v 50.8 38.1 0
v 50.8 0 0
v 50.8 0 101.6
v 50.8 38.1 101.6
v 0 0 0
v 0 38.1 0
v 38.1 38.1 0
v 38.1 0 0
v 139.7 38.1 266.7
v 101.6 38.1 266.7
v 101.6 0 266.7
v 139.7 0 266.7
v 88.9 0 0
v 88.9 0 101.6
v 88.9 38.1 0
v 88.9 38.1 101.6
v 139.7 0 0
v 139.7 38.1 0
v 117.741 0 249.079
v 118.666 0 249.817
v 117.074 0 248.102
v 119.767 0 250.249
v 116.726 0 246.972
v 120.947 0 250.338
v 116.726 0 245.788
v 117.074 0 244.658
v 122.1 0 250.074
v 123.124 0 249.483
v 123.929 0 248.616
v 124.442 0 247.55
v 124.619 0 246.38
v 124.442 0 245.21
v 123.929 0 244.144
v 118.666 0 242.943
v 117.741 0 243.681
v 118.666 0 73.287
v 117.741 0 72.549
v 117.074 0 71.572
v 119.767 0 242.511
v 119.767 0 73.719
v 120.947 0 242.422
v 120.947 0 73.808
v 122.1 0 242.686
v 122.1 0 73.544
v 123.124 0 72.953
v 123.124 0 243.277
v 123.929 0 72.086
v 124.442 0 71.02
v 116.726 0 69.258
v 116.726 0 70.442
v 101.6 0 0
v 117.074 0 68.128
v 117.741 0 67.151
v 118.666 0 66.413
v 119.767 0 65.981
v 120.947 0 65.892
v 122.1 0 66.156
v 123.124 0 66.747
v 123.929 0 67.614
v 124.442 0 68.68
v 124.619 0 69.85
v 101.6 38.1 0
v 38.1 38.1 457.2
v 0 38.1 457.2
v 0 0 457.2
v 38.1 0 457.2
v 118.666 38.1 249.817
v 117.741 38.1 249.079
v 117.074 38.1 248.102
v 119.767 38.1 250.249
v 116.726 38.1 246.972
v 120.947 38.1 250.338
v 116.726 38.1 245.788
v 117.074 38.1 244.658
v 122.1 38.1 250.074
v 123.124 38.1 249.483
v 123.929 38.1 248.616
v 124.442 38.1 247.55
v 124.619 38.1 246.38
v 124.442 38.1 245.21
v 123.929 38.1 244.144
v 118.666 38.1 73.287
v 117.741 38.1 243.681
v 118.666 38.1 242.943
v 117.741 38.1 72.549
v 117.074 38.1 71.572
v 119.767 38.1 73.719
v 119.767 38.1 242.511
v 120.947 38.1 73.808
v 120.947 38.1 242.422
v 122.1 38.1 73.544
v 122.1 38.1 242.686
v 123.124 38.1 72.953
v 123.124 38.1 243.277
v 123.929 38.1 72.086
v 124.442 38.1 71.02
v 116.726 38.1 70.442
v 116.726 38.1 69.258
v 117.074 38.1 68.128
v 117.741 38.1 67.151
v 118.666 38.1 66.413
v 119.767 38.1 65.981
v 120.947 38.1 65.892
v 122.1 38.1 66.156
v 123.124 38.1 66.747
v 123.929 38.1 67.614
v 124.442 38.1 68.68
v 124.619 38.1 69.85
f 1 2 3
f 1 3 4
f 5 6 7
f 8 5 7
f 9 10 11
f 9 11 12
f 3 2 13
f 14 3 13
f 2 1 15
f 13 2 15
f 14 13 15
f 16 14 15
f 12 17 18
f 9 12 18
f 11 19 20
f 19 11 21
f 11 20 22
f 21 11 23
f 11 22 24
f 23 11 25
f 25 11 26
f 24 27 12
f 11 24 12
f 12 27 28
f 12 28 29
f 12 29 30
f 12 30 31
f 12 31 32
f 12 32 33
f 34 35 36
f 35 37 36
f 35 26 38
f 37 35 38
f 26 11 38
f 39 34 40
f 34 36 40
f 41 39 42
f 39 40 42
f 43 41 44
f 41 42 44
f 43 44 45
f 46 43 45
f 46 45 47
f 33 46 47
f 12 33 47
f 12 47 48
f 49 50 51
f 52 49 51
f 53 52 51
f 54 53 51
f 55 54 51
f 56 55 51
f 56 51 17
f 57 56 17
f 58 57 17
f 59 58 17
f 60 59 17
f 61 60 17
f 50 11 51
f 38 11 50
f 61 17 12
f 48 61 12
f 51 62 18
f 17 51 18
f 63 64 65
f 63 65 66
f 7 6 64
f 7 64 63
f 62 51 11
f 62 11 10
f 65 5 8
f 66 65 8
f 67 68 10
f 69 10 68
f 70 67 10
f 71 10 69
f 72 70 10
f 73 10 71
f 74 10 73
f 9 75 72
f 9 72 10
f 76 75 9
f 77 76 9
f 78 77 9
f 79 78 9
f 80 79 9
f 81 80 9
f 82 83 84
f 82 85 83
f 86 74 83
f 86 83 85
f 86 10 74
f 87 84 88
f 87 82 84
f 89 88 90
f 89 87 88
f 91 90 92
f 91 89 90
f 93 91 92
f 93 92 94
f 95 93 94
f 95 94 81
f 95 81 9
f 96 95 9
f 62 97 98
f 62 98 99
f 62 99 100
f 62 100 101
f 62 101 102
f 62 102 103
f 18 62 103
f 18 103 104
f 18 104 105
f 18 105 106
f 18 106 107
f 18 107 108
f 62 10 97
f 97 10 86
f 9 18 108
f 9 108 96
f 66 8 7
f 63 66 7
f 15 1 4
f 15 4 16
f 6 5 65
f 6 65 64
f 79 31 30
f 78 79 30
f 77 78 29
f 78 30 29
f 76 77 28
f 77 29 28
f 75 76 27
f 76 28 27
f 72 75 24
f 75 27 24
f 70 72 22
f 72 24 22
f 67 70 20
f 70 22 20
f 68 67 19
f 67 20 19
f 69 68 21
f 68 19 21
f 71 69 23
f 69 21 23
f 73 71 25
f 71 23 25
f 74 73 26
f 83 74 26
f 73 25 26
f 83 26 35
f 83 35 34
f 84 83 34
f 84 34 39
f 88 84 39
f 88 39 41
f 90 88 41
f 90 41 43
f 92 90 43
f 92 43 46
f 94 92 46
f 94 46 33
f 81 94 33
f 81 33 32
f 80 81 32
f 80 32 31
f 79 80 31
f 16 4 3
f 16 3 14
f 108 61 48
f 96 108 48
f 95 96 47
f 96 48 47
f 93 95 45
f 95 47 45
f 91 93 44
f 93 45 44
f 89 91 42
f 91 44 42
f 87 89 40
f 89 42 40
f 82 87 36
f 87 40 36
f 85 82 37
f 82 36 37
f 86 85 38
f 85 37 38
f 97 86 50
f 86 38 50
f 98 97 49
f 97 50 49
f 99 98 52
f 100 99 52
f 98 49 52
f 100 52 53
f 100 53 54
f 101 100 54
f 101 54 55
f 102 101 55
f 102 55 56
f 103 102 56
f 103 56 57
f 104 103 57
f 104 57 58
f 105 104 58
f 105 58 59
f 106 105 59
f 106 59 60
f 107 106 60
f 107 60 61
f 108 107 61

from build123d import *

# Parameters (mm, degrees)
F0_W     = 38.1
F0_H     = 38.1
F1_DEPTH = 457.2
F2_DEPTH = 101.6
F3_DEPTH = 266.7
F4_R     = 3.96875
F5_DEPTH = 38.101


with BuildPart() as f1:
    # F0 (on Top) → F1 (new body)
    with BuildSketch(Plane.XY):
        with Locations((19.05, 19.05)):
            Rectangle(F0_W, F0_H)
    extrude(amount=F1_DEPTH)


with BuildPart() as f2:
    # F0 (on Top) → F2 (new body)
    with BuildSketch(Plane.XY):
        with Locations((69.85, 19.05)):
            Rectangle(F0_W, F0_H)
    extrude(amount=F2_DEPTH)


with BuildPart() as f3:
    # F0 (on Top) → F3 (new body)
    with BuildSketch(Plane.XY):
        with Locations((120.65, 19.05)):
            Rectangle(F0_W, F0_H)
    extrude(amount=F3_DEPTH)

    # F4 (on face) → F5 (cut, through all)
    with BuildSketch(Plane.XZ):
        with Locations((120.65, 69.85)):
            Circle(F4_R)
        with Locations((120.65, 246.38)):
            Circle(F4_R)
    extrude(amount=-F5_DEPTH, mode=Mode.SUBTRACT)


solid = Compound([f1.part, f2.part, f3.part])
